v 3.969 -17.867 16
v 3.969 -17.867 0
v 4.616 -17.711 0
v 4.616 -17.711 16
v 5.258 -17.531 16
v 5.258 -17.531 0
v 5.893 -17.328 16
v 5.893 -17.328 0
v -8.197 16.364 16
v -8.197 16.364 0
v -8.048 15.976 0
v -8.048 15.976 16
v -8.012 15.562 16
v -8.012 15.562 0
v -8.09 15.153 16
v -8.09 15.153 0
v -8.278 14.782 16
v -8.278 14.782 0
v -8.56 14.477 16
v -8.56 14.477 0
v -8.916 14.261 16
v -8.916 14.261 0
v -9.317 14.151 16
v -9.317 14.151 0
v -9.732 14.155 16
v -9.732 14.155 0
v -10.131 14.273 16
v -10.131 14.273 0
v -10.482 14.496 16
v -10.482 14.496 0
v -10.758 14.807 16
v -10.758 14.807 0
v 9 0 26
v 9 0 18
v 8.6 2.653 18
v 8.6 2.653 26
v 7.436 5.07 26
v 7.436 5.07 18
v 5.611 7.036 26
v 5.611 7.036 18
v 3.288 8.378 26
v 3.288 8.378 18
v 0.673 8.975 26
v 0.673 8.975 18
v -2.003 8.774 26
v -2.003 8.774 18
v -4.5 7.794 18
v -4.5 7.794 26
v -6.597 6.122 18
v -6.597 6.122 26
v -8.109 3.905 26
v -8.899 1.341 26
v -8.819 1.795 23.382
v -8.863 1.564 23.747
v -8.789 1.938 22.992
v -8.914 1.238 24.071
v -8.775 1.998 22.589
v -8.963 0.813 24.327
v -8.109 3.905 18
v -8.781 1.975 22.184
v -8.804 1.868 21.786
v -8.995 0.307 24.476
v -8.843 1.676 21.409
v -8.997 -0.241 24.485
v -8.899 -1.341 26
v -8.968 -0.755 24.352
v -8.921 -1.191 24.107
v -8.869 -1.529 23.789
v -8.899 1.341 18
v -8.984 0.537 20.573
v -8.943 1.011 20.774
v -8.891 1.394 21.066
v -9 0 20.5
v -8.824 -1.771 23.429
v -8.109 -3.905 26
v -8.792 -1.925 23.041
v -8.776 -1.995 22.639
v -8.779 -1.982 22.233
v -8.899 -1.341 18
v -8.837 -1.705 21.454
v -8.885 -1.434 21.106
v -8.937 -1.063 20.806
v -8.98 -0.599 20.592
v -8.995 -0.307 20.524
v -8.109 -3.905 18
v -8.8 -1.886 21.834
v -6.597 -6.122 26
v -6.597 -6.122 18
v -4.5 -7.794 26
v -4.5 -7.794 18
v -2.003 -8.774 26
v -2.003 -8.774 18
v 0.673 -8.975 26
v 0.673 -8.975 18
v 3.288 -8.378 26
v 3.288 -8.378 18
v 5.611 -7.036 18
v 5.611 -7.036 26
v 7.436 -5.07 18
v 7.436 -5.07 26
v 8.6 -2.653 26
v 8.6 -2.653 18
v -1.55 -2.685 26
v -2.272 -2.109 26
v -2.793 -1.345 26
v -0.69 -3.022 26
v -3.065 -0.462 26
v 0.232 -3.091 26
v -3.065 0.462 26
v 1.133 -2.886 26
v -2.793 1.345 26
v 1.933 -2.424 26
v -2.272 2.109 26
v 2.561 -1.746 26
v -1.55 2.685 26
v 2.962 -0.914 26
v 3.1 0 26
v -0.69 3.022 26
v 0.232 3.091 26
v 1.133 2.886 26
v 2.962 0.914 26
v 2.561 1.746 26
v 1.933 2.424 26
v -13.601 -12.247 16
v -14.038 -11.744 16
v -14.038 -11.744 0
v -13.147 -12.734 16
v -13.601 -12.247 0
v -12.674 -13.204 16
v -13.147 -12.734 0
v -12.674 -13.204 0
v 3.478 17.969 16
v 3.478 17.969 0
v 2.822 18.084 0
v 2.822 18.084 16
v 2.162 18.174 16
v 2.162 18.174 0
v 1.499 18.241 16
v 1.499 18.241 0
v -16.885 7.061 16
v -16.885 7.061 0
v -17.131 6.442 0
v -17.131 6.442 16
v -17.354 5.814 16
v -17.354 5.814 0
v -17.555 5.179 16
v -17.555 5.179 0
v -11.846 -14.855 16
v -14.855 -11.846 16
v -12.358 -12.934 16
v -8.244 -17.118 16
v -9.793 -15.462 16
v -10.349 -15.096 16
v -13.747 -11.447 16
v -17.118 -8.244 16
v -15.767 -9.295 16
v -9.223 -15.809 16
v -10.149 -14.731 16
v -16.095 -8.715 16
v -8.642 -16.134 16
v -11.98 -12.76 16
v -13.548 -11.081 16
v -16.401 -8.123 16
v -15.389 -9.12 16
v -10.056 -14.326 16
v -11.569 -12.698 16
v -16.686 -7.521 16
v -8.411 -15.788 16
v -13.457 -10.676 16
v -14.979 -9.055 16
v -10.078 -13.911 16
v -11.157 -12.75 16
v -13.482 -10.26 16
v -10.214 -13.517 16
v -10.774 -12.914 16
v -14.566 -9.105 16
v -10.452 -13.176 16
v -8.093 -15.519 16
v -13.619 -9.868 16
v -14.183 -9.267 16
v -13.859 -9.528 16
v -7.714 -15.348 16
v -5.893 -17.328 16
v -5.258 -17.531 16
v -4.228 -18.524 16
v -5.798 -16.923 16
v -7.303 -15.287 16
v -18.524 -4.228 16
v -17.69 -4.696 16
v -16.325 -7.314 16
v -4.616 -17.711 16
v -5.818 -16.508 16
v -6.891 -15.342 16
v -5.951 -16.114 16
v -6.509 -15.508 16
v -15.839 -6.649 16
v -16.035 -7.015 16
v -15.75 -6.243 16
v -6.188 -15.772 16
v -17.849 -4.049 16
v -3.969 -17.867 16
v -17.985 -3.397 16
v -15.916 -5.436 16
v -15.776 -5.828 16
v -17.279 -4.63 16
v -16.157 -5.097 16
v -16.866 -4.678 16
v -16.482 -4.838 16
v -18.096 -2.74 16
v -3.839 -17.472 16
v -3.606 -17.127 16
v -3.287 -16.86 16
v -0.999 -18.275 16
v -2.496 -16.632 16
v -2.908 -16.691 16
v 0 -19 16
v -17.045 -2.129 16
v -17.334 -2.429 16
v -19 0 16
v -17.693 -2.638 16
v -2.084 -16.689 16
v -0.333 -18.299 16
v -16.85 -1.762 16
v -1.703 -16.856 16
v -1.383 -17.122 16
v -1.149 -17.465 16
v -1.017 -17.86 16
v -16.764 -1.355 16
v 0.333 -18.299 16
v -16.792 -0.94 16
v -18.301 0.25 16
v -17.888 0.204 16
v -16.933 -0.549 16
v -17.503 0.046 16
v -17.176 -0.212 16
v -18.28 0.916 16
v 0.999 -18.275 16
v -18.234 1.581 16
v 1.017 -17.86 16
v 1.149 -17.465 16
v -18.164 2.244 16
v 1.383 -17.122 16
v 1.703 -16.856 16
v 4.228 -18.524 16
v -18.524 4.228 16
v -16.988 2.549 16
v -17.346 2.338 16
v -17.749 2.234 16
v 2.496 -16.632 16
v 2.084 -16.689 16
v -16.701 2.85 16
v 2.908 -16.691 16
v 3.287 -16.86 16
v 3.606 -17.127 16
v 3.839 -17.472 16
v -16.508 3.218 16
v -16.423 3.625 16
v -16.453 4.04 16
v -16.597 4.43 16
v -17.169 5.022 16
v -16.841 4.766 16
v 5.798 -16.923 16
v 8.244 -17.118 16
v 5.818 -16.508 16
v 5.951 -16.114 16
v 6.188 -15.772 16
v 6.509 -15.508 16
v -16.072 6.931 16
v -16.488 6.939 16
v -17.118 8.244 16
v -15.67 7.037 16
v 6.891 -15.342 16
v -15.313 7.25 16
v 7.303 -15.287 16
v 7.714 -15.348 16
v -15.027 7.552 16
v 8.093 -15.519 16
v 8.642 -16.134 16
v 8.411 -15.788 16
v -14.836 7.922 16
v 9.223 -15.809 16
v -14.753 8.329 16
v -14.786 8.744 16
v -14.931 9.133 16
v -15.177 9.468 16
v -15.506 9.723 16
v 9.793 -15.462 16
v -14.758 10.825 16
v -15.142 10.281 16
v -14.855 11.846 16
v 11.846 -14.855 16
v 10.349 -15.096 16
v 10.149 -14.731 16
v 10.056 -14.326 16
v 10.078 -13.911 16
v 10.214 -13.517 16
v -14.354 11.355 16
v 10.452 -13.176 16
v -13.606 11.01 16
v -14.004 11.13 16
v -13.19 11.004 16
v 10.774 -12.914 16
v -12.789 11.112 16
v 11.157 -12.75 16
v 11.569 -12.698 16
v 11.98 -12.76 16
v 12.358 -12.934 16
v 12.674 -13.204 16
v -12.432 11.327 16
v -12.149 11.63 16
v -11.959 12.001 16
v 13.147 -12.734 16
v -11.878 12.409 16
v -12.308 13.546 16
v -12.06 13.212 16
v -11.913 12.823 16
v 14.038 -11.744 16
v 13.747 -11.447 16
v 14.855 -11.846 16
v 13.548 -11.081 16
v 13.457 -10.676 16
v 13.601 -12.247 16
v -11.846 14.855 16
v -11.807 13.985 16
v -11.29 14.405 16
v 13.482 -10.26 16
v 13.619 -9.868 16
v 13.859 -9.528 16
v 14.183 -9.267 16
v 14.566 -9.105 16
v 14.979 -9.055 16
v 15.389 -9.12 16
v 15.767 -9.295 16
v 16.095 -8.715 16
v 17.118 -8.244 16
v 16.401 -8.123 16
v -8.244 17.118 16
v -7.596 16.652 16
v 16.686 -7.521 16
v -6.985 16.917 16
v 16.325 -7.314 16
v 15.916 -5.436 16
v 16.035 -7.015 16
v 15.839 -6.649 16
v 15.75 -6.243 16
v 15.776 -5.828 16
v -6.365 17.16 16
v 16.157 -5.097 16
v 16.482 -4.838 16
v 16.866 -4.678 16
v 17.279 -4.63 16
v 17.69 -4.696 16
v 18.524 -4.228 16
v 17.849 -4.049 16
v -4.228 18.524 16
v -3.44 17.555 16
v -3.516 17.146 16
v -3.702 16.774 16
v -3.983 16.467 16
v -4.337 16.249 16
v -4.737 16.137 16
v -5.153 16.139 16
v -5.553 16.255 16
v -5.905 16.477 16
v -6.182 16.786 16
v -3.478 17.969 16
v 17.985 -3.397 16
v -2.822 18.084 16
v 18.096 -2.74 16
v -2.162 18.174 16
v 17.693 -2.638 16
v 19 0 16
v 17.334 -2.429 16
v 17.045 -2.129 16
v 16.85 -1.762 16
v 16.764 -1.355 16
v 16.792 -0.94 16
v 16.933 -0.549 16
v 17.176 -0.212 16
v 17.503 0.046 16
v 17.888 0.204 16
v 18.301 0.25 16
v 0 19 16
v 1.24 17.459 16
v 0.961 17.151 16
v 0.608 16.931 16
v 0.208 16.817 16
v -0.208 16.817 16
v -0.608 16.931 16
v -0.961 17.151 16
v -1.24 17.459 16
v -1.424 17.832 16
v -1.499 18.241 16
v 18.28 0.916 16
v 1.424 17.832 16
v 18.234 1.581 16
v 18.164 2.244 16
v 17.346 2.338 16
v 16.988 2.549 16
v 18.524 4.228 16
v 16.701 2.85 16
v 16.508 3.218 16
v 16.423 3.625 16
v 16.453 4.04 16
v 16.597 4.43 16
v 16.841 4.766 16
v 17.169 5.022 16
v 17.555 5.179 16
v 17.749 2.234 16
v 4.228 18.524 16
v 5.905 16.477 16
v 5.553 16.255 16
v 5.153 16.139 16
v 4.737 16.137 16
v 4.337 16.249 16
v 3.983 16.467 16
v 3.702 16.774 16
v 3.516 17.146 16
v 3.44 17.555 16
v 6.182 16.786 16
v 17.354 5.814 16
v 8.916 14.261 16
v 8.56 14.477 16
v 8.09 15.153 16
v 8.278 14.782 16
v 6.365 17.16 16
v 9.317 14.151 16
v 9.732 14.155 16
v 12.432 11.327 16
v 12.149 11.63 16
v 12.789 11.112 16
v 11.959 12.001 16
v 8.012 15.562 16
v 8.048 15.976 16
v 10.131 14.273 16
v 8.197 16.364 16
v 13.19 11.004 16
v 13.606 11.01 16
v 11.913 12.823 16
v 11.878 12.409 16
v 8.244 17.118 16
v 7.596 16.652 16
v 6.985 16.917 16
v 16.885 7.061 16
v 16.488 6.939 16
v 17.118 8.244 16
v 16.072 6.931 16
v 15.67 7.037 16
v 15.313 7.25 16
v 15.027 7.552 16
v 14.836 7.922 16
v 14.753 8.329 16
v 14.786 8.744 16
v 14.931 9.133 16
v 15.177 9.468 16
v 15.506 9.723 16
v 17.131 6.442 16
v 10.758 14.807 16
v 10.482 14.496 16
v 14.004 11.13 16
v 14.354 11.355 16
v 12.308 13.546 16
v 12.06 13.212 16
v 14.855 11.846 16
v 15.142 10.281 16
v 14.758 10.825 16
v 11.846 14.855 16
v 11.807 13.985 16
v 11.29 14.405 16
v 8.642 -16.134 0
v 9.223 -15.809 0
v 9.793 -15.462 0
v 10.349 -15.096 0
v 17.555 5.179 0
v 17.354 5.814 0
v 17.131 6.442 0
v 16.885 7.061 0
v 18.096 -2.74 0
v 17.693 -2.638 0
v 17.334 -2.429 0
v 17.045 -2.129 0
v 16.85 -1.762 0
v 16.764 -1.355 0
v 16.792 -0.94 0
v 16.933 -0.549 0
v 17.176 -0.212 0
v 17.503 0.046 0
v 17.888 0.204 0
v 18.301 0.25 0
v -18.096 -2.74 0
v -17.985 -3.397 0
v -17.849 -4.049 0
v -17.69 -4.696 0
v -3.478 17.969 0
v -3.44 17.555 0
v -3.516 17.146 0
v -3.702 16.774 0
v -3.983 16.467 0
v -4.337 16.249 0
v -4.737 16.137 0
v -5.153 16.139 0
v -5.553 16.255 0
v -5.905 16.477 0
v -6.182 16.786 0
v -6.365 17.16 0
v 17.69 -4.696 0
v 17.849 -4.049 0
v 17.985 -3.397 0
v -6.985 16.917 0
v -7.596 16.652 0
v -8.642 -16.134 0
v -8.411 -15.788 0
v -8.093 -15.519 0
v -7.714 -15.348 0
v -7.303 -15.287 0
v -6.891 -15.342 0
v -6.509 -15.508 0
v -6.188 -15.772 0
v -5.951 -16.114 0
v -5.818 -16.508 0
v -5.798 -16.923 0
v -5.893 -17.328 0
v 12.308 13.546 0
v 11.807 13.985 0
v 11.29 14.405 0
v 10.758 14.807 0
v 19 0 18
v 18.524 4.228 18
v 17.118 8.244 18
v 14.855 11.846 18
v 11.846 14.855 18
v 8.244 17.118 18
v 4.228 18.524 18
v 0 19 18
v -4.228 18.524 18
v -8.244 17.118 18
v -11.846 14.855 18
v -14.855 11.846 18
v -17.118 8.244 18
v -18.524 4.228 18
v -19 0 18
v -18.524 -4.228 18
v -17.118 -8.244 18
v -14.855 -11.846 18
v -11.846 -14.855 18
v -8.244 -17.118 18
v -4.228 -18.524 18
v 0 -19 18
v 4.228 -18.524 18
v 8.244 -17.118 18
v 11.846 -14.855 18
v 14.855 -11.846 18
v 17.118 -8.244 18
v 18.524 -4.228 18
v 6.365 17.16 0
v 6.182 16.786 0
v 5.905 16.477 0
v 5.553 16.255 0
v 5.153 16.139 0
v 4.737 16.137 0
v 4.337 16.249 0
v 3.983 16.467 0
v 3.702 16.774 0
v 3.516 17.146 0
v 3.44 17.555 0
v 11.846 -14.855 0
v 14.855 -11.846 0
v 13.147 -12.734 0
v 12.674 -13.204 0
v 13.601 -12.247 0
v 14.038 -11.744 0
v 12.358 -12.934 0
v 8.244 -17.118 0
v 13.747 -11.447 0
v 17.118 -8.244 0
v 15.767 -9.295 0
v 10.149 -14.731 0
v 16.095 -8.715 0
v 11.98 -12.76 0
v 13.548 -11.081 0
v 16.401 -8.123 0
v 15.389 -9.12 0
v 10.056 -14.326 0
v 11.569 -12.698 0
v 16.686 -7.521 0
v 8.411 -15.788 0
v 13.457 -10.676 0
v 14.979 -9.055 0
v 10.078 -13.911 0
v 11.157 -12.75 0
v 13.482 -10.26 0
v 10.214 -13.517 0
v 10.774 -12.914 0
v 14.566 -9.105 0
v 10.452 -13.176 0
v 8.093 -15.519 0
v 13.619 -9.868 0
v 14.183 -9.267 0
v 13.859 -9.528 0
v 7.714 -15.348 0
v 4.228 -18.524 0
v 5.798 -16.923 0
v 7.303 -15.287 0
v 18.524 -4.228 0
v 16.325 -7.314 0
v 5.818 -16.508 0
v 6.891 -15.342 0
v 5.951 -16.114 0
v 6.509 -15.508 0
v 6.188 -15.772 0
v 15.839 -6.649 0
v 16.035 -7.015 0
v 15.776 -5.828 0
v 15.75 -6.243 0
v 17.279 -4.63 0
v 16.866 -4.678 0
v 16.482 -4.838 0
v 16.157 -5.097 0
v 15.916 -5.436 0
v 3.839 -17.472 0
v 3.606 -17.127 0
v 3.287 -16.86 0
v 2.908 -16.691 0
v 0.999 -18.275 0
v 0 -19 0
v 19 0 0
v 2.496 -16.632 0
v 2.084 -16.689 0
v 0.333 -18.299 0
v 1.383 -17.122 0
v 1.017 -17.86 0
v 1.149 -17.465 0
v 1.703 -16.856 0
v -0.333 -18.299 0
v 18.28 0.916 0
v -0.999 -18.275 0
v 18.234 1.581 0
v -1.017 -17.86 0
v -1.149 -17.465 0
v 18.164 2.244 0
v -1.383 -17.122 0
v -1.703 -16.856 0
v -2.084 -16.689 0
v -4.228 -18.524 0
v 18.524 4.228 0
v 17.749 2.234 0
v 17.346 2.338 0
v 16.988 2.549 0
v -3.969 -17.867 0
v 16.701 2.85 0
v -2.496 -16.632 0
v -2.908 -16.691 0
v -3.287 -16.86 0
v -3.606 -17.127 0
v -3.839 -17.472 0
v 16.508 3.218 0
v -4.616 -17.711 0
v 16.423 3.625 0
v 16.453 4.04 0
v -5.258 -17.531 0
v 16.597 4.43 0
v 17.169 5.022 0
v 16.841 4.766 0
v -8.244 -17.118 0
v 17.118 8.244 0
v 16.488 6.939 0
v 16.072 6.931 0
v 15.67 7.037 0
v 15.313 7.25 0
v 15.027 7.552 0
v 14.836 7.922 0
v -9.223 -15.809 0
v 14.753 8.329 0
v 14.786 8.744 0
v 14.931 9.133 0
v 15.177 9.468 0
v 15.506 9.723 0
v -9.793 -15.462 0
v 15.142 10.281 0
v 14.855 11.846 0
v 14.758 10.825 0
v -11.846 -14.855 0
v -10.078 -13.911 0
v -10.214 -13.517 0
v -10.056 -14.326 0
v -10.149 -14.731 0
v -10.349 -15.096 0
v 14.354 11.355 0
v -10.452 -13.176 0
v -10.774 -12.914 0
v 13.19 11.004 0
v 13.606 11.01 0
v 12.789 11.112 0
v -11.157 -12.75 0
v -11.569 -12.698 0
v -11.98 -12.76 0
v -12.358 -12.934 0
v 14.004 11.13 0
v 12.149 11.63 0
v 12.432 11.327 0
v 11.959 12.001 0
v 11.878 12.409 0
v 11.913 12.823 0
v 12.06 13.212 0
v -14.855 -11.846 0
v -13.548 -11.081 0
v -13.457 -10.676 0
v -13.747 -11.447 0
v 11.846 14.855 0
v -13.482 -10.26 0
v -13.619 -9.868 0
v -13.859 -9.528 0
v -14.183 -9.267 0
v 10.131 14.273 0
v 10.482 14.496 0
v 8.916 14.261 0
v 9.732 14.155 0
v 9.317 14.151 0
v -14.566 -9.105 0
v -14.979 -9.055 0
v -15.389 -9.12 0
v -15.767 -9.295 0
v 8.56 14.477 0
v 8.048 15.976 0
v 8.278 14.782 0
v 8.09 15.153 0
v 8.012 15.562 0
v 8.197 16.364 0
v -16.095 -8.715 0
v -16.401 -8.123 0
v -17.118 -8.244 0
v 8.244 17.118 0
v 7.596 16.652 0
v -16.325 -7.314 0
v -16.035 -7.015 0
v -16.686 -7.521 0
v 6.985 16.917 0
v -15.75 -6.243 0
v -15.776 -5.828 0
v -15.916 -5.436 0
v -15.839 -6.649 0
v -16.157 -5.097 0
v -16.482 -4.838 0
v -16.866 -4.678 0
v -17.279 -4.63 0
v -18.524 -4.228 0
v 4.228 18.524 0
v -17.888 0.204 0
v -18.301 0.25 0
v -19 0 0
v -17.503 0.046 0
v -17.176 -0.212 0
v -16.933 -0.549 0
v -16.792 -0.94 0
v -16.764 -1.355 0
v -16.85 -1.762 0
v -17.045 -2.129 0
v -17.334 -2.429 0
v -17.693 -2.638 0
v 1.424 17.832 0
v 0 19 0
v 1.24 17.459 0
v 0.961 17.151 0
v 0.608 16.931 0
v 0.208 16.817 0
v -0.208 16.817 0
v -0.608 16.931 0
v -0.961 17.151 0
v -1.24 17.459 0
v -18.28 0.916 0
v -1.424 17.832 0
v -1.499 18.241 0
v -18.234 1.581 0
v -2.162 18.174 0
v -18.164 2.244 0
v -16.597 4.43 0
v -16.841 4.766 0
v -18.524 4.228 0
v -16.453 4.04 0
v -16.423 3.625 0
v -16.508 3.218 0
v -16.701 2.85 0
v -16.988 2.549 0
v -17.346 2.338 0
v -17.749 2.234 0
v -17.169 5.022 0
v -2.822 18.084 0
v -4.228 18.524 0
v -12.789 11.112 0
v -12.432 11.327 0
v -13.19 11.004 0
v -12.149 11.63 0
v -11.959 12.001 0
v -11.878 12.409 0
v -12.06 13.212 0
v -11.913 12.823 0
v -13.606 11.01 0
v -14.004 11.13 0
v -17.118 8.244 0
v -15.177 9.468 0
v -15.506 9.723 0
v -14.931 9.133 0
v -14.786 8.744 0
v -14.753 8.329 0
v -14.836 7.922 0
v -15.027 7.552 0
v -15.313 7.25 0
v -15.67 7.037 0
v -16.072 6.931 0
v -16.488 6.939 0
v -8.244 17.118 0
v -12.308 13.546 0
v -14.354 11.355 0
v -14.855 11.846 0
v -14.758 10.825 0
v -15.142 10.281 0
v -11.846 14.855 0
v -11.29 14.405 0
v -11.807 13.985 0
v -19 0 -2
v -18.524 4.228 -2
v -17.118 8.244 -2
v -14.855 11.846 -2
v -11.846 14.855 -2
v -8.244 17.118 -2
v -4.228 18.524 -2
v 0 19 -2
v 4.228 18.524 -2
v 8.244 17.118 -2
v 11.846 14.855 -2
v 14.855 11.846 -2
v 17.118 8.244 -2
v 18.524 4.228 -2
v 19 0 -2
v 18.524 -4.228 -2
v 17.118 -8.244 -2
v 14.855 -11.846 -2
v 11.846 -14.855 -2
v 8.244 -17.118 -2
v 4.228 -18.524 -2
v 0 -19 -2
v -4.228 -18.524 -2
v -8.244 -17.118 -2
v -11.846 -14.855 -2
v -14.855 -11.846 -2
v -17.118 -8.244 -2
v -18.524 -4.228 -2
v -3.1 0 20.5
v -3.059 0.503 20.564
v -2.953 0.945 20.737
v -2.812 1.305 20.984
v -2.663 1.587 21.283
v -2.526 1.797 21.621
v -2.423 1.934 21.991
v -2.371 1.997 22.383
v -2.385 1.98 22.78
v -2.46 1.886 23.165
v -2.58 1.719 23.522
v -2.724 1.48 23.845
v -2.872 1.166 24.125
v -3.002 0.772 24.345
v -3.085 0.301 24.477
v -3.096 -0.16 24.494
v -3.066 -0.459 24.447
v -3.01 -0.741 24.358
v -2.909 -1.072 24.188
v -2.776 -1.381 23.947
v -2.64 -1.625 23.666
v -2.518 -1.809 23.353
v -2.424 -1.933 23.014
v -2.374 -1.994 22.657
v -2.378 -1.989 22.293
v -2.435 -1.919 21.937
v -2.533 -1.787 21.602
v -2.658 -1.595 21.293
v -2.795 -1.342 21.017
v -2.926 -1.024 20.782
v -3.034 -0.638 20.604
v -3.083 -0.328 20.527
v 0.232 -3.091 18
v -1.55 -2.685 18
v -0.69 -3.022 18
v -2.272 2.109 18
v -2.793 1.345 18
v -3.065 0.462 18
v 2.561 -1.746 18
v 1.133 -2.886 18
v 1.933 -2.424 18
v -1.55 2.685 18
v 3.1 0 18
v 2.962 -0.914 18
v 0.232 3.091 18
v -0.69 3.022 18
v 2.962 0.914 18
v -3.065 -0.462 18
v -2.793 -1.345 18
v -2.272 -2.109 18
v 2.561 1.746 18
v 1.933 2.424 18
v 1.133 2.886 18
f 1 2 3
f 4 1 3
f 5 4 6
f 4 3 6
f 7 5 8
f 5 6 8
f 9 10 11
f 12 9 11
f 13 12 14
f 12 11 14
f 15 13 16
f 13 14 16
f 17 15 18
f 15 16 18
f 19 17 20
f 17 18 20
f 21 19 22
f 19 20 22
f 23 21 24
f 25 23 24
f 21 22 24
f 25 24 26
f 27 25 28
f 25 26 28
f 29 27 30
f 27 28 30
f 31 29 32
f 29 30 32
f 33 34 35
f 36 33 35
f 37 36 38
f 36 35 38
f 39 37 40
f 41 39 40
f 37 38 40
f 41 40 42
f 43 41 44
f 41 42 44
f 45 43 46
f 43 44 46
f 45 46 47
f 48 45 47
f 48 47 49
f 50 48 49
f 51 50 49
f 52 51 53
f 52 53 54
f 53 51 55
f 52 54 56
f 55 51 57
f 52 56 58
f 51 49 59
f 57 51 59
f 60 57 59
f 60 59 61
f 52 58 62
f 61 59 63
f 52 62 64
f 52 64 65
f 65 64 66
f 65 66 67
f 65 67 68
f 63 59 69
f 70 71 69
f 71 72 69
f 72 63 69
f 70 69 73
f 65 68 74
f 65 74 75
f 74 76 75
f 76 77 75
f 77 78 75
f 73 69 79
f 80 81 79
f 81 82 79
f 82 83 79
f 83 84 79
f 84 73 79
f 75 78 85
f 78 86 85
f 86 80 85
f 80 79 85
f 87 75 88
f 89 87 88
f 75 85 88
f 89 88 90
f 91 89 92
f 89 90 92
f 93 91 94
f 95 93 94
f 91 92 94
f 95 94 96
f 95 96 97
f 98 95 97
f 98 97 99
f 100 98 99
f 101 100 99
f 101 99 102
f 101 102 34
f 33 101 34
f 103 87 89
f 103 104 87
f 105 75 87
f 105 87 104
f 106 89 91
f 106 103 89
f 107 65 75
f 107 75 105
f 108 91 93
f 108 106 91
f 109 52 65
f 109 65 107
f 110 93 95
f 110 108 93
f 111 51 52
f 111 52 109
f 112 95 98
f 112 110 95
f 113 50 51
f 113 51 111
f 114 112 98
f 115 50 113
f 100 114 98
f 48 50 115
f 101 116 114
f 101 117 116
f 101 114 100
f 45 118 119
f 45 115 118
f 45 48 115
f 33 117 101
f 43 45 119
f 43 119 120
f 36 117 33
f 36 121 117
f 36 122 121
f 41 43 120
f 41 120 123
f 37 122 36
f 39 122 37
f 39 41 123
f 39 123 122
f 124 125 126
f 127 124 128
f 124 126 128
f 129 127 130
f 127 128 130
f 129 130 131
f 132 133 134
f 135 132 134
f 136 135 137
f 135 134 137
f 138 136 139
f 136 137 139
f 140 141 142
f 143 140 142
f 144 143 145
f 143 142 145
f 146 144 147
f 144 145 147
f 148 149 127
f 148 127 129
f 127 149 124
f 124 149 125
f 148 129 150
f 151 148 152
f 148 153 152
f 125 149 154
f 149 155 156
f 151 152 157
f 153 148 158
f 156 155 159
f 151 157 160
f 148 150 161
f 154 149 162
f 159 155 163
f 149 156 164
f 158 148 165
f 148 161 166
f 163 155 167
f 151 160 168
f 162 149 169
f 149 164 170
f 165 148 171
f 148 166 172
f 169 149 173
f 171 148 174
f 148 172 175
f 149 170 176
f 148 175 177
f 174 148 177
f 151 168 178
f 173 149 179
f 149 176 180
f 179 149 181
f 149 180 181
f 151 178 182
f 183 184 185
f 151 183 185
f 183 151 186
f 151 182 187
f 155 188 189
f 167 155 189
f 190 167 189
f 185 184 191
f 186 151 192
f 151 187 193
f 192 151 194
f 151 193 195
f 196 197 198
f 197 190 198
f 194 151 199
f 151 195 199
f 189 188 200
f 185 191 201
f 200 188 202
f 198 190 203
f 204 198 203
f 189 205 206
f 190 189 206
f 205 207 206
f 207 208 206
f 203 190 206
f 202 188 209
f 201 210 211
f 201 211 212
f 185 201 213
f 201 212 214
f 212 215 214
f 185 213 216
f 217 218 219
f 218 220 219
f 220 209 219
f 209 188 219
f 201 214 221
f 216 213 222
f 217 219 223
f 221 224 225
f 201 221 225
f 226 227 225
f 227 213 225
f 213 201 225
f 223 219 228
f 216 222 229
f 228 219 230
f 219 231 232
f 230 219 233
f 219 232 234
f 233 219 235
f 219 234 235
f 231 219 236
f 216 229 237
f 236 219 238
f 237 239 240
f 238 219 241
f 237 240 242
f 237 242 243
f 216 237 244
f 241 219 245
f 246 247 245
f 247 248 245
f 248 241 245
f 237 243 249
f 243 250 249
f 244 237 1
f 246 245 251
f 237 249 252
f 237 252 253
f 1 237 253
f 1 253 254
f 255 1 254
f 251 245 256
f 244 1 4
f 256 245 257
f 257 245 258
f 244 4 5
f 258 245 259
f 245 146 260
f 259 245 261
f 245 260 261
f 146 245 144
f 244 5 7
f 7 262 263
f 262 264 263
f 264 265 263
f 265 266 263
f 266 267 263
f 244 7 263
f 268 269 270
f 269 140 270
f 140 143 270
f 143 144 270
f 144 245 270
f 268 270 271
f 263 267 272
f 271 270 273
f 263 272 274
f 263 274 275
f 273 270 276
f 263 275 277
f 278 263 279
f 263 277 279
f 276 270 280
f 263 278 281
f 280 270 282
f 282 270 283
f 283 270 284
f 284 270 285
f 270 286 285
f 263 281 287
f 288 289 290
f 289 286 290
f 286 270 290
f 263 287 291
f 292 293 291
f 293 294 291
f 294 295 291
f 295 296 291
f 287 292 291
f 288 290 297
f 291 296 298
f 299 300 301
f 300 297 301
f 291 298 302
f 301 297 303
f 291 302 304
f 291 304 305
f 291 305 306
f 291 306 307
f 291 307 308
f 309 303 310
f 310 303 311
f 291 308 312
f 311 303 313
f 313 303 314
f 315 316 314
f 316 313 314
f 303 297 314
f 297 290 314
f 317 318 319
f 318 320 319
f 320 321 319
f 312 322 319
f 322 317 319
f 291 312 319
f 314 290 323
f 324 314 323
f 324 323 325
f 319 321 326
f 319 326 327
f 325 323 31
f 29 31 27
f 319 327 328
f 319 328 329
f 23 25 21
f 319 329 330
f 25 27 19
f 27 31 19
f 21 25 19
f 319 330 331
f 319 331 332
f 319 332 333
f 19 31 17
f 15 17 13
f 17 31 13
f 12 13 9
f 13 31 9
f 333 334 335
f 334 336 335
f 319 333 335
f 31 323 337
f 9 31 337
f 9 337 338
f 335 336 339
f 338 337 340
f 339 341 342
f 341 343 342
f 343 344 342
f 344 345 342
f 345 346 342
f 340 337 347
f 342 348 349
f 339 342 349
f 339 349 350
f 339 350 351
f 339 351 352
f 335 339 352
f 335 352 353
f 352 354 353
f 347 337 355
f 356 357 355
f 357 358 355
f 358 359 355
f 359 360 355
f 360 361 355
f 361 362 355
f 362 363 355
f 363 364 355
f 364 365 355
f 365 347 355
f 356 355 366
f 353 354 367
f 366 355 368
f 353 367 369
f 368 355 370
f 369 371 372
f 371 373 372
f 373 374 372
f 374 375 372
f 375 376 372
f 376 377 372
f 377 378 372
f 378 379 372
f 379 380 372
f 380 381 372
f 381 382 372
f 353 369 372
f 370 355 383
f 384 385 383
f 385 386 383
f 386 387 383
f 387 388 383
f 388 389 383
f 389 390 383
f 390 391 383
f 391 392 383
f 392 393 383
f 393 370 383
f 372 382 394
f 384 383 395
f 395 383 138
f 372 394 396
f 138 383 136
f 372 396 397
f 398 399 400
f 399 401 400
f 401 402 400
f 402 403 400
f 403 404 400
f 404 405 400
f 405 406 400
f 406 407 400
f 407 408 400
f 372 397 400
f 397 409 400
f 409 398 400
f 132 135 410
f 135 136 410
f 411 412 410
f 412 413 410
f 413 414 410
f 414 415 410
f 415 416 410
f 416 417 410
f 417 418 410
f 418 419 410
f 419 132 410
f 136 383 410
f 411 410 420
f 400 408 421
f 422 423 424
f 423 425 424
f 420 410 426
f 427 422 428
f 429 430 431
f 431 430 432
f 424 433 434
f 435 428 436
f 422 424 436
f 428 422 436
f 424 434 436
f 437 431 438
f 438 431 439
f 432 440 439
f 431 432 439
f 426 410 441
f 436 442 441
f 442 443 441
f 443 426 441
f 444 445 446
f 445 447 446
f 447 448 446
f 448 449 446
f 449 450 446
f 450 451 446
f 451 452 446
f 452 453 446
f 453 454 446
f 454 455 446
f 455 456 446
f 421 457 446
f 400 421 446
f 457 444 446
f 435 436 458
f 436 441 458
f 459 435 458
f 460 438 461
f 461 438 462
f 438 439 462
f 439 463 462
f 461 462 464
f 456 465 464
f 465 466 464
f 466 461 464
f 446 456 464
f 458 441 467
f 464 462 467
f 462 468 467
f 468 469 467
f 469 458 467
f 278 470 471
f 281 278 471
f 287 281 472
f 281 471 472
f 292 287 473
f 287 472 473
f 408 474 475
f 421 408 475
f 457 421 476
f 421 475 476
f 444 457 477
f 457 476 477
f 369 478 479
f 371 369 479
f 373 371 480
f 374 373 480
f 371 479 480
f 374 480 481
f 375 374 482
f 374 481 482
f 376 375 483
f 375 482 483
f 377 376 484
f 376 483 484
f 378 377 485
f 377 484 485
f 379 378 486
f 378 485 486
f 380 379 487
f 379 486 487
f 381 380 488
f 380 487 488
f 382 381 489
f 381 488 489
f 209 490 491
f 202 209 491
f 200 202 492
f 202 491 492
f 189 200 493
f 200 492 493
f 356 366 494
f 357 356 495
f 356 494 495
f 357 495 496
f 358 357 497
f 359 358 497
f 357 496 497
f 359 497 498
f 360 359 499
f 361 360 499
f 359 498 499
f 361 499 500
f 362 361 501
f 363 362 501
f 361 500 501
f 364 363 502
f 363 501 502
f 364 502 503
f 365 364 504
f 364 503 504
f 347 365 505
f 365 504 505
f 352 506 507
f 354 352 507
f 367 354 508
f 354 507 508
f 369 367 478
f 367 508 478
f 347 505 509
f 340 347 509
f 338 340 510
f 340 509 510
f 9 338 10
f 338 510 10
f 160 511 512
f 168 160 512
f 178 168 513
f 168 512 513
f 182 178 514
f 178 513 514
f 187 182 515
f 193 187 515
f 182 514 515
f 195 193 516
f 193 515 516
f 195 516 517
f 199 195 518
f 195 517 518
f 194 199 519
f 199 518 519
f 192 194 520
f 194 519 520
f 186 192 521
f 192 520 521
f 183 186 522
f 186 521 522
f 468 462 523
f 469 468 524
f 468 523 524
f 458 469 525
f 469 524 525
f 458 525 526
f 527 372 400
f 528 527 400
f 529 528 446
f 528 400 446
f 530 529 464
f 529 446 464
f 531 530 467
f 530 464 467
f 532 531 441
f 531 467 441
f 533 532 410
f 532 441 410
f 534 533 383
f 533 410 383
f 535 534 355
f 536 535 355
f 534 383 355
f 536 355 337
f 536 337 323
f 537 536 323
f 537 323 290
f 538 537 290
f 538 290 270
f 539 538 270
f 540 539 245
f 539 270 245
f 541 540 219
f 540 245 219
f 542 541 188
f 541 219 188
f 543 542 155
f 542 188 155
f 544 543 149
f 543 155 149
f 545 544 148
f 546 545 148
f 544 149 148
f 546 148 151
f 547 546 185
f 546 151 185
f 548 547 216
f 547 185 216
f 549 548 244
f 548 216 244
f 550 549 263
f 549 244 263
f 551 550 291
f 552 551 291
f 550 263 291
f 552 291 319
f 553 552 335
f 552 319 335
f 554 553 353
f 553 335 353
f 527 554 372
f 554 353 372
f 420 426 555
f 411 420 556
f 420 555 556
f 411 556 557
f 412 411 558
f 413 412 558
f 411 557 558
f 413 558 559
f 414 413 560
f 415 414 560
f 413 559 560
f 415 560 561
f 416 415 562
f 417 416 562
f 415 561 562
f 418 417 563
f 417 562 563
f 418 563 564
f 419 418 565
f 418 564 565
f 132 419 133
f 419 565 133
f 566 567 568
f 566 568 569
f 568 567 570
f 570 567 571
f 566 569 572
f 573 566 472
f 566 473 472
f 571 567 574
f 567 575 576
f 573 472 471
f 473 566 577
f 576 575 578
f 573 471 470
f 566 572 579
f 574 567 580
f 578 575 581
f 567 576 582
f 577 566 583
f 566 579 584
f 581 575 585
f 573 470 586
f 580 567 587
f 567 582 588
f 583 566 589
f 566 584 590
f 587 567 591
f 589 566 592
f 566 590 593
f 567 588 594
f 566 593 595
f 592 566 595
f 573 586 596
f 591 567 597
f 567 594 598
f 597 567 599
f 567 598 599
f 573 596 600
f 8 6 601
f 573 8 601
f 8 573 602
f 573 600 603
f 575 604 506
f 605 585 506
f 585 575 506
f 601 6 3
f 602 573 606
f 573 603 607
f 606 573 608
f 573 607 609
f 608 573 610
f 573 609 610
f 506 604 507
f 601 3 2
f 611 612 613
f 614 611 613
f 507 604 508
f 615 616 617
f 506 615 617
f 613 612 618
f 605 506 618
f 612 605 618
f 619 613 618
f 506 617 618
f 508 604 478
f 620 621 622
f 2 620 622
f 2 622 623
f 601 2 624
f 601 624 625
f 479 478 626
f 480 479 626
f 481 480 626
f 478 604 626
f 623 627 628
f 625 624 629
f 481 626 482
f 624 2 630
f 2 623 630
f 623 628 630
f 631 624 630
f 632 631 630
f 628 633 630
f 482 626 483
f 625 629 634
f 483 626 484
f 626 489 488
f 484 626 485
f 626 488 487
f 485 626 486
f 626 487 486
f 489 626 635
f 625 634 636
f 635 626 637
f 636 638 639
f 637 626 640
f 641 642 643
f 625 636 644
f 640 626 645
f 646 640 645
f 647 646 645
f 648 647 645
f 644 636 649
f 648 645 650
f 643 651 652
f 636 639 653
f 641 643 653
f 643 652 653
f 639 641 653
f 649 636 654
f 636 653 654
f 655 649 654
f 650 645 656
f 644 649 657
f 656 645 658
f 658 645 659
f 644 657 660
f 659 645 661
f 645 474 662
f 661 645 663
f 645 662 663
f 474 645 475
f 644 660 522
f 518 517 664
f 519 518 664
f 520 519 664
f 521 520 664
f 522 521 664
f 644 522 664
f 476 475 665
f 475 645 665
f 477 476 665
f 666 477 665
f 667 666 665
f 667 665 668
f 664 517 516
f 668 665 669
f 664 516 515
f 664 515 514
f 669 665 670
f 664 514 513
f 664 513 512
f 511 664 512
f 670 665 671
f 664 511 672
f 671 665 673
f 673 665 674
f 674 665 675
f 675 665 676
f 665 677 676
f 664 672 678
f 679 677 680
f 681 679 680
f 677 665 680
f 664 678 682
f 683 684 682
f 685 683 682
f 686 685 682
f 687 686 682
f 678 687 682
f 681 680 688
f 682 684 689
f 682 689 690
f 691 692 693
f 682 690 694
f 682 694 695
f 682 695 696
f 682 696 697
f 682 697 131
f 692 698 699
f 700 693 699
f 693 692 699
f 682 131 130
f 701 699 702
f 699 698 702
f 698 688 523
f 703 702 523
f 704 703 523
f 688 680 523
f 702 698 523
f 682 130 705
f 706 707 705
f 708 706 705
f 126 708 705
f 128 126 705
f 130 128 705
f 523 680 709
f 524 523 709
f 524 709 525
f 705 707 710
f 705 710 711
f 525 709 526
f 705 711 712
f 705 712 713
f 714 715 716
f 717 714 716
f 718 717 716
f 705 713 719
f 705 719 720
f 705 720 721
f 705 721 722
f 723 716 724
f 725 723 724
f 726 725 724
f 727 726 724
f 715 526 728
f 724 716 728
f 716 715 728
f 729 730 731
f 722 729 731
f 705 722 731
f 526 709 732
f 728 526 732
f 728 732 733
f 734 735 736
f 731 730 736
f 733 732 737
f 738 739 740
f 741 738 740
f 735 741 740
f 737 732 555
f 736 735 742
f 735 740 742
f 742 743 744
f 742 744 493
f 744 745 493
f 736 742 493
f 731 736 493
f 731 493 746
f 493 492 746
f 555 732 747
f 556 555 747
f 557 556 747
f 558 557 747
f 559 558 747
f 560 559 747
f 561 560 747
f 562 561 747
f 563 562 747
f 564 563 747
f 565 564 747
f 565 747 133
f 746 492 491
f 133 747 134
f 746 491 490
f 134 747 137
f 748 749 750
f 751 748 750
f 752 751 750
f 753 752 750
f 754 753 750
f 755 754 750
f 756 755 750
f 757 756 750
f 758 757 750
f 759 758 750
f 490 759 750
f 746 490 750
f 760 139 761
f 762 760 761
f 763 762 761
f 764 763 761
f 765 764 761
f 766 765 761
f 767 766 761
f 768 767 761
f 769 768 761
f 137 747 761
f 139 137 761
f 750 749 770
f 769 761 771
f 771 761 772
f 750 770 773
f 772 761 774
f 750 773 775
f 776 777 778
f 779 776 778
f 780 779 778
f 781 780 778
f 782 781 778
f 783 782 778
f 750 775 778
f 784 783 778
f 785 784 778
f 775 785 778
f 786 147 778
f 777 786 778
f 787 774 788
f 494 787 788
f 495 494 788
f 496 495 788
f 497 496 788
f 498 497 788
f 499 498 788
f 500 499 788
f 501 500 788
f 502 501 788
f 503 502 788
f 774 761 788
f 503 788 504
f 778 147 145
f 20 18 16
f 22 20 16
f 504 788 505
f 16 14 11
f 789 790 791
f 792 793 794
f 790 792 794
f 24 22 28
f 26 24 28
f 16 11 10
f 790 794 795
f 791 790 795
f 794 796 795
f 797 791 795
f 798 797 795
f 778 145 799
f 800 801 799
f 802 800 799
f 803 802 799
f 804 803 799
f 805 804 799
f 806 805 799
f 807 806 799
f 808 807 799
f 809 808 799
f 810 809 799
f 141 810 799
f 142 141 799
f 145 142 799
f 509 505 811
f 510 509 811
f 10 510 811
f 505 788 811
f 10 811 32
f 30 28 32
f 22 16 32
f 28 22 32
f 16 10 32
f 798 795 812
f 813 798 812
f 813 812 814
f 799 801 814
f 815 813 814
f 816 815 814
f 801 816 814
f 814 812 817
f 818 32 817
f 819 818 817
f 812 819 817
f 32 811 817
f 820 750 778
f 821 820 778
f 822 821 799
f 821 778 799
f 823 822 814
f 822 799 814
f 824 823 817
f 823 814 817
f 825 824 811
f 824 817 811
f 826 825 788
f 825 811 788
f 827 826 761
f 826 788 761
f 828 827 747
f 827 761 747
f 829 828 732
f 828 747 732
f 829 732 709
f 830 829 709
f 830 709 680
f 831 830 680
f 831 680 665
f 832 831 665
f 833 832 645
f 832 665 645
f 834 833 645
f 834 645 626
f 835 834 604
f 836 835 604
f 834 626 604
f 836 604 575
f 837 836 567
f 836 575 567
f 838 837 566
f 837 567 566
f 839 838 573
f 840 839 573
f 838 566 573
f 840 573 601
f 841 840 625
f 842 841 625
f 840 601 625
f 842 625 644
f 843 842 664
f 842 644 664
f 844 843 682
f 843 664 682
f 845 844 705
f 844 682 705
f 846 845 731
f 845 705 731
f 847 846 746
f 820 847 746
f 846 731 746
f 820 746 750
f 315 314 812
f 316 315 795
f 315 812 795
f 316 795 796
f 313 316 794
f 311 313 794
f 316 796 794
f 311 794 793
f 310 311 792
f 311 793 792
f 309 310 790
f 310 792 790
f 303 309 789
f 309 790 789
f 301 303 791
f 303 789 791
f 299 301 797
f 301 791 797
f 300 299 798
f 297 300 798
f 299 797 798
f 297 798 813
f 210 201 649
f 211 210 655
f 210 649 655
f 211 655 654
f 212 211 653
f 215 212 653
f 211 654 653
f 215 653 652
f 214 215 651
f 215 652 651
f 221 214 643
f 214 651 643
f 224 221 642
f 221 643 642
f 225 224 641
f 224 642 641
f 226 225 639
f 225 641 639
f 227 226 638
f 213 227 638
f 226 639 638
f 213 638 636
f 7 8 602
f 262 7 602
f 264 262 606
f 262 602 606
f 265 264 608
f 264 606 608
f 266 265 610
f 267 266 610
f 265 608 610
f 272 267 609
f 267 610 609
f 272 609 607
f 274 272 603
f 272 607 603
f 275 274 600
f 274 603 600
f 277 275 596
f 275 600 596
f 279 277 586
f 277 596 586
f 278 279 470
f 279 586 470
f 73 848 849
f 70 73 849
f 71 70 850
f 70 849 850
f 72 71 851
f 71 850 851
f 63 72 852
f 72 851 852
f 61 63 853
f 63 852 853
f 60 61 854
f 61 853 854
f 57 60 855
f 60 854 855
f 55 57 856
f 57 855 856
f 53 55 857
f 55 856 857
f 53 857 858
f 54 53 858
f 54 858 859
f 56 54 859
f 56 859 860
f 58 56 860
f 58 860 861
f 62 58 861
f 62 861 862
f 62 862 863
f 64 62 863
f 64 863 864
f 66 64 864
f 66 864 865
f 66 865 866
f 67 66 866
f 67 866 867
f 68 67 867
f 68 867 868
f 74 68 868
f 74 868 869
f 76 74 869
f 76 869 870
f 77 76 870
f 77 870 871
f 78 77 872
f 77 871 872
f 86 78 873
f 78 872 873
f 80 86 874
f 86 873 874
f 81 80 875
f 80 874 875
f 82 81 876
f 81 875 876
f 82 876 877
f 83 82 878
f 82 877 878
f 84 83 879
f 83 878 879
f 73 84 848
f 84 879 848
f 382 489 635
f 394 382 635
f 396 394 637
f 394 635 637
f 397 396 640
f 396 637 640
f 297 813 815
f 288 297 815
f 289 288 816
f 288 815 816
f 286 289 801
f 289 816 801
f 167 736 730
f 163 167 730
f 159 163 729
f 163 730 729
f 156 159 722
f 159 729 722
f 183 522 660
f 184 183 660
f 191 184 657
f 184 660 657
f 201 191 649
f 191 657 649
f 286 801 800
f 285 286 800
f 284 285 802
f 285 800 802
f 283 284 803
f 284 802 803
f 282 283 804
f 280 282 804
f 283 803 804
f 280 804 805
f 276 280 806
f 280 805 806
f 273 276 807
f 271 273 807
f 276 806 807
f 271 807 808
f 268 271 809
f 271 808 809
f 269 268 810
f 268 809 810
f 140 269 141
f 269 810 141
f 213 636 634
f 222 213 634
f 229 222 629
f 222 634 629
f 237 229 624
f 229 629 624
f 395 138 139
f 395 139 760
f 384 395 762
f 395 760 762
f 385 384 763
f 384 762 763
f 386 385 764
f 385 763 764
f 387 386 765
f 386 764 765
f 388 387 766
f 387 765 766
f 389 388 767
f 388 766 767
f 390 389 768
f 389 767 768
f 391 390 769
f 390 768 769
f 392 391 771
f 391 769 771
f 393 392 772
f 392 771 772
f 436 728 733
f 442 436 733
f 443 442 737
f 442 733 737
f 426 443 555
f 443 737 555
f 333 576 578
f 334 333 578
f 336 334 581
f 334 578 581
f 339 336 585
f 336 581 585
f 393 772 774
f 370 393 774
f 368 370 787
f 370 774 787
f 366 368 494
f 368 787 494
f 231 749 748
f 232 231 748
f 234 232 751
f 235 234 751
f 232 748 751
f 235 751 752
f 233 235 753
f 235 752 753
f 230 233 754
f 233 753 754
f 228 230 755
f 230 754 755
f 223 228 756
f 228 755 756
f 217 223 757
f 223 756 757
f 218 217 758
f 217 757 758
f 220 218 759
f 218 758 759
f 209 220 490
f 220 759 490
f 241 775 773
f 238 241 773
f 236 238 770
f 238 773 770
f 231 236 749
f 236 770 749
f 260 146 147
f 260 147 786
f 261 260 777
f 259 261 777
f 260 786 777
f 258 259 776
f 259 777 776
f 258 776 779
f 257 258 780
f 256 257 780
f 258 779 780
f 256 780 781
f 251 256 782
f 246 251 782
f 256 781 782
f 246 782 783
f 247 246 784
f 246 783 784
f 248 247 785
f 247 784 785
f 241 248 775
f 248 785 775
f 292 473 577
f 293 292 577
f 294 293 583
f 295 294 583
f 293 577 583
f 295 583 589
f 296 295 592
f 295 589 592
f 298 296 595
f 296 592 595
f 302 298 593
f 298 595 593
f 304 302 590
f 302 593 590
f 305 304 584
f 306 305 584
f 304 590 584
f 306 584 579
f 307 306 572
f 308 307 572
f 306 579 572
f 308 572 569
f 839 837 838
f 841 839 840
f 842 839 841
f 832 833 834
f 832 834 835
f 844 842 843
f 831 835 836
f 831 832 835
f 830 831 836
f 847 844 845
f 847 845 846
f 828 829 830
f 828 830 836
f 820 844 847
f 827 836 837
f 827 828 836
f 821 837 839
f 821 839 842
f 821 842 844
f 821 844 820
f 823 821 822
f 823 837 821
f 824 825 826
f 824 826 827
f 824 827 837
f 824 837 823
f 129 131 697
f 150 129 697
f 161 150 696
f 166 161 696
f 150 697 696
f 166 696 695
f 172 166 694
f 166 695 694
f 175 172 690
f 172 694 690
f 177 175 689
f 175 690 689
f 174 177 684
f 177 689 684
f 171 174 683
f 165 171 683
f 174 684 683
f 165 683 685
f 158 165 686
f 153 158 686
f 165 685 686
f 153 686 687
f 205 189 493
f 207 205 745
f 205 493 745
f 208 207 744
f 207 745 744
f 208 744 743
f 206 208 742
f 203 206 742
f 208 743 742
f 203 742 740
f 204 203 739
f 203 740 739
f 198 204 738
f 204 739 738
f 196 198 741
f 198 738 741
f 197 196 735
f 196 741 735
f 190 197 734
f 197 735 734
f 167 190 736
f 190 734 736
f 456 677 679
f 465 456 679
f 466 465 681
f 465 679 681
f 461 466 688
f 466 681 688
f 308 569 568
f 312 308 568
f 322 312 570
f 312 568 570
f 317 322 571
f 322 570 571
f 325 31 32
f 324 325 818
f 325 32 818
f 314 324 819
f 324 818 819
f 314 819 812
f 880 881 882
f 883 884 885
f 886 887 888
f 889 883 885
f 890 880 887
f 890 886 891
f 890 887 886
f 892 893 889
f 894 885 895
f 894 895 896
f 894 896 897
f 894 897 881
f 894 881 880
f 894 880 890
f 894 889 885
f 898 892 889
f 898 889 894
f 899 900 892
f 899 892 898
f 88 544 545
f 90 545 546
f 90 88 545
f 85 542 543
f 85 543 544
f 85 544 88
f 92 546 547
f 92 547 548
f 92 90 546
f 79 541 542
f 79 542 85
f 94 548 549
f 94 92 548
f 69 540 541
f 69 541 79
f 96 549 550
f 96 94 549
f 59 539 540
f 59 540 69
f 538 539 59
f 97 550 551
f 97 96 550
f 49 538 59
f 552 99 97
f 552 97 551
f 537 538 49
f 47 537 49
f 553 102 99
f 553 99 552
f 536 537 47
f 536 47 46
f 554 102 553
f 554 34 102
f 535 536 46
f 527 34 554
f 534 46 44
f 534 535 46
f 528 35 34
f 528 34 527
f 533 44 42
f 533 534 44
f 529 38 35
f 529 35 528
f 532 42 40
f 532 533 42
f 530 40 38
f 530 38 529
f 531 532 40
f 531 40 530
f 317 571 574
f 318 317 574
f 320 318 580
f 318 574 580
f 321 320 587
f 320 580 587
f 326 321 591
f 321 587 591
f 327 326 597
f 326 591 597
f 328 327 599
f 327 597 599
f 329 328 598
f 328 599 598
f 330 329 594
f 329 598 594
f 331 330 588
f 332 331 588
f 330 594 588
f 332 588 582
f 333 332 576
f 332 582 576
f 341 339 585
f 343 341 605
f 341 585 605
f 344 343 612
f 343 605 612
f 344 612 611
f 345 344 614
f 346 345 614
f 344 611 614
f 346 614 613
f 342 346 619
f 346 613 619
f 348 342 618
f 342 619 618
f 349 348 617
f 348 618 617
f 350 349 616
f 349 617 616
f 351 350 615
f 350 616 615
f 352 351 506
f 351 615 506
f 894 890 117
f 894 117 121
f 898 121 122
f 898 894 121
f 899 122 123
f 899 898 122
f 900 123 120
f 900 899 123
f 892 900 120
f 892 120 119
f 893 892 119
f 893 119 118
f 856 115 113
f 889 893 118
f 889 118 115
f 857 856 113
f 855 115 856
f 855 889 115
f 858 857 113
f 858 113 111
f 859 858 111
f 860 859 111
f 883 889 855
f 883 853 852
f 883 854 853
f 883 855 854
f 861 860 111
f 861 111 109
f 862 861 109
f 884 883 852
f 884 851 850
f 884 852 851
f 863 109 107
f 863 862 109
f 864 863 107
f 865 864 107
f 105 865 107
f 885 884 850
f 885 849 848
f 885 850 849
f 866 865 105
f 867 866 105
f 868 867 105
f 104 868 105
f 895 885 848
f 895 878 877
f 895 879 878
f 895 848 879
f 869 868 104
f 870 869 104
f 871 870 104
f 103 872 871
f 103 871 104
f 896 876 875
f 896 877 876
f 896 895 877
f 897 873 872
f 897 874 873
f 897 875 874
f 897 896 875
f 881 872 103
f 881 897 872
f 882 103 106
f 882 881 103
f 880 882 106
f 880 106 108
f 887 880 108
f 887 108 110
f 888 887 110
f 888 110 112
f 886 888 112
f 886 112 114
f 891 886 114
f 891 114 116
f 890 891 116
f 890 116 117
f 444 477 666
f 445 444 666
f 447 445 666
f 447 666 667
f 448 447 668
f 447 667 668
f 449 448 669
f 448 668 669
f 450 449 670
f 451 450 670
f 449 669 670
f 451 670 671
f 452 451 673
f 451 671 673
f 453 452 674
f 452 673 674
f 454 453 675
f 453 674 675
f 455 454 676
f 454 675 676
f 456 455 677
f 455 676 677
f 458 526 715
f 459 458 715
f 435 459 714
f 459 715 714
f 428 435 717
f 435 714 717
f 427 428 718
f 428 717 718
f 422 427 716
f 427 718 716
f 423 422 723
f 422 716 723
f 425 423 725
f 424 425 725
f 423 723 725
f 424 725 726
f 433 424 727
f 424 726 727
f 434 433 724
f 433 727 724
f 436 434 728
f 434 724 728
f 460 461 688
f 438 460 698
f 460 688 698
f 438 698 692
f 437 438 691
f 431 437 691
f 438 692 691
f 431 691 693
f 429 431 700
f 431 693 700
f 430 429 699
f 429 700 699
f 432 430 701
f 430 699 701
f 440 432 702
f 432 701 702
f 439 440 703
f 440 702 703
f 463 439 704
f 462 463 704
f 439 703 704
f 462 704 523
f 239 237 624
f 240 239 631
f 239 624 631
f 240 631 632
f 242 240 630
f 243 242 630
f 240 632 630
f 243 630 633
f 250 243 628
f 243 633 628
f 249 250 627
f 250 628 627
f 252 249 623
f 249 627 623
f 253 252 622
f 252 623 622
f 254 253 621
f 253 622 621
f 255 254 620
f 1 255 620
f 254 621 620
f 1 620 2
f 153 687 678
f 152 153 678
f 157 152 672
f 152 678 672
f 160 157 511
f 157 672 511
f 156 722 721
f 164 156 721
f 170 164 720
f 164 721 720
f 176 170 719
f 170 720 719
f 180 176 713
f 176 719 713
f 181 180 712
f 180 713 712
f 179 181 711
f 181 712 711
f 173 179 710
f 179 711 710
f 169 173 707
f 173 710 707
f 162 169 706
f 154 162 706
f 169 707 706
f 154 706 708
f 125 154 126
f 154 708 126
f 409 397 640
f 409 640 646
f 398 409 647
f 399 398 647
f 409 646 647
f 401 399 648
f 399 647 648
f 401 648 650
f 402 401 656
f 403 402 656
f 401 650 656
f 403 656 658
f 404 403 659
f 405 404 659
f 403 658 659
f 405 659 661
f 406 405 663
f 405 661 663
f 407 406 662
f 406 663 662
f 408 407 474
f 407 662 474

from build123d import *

# Parameters (mm, degrees)
EXTRUDE_1_DEPTH     = 16
SKETCH_2_R          = 19
EXTRUDE_2_DEPTH     = 2
SKETCH_3_R          = 19
EXTRUDE_3_DEPTH     = 2
SKETCH_4_R          = 9
SKETCH_4_R_2        = 3.1
EXTRUDE_4_DEPTH     = 8
SKETCH_5_R          = 2
CUT_EXTRUDE_1_DEPTH = 20


with BuildPart() as part:
    # Эскиз1 → Бобышка-Вытянуть1 (new body)
    with BuildSketch(Plane.XY):
        with BuildLine():
            ThreePointArc((-1.498740073, 18.241032987), (-2.492190095, 18.132029527), (-3.478209077, 17.968961235))
            ThreePointArc((-3.478209077, 17.968961235), (-4.533260247, 16.179417721), (-6.364534528, 17.16025077))
            ThreePointArc((-6.364534528, 17.16025077), (-7.291735947, 16.787259846), (-8.197195372, 16.364213831))
            ThreePointArc((-8.197195372, 16.364213831), (-8.73030932, 14.356382045), (-10.758300573, 14.806771256))
            ThreePointArc((-10.758300573, 14.806771256), (-11.550487101, 14.197455898), (-12.308233185, 13.545807547))
            ThreePointArc((-12.308233185, 13.545807547), (-12.27987129, 11.468599189), (-14.35417268, 11.355141255))
            ThreePointArc((-14.35417268, 11.355141255), (-14.952591467, 10.554691596), (-15.50642565, 9.722770687))
            ThreePointArc((-15.50642565, 9.722770687), (-14.918691382, 7.730242796), (-16.885461466, 7.061352373))
            ThreePointArc((-16.885461466, 7.061352373), (-17.245730527, 6.129134102), (-17.554577461, 5.178640403))
            ThreePointArc((-17.554577461, 5.178640403), (-16.451060383, 3.418569659), (-18.164432821, 2.243855289))
            ThreePointArc((-18.164432821, 2.243855289), (-18.259832648, 1.249006771), (-18.300786569, 0.250434051))
            ThreePointArc((-18.300786569, 0.250434051), (-16.763329494, -1.146643151), (-18.09623129, -2.740058277))
            ThreePointArc((-18.09623129, -2.740058277), (-17.919686515, -3.723753679), (-17.689710057, -4.696345849))
            ThreePointArc((-17.689710057, -4.696345849), (-15.832339144, -5.626814684), (-16.685915069, -7.520754256))
            ThreePointArc((-16.685915069, -7.520754256), (-16.25051921, -8.420340353), (-15.766668676, -9.294819262))
            ThreePointArc((-15.766668676, -9.294819262), (-13.727136627, -9.689671112), (-14.03808086, -11.743670296))
            ThreePointArc((-14.03808086, -11.743670296), (-13.376125236, -12.492428904), (-12.674285607, -13.203938451))
            ThreePointArc((-12.674285607, -13.203938451), (-10.603855185, -13.033888962), (-10.349106414, -15.095612034))
            ThreePointArc((-10.349106414, -15.095612034), (-9.509685246, -15.638011152), (-8.641908755, -16.133781929))
            ThreePointArc((-8.641908755, -16.133781929), (-6.694134312, -15.411442894), (-5.892586089, -17.327981286))
            ThreePointArc((-5.892586089, -17.327981286), (-4.937955404, -17.623793652), (-3.968601065, -17.867056608))
            ThreePointArc((-3.968601065, -17.867056608), (-2.287940121, -16.646000608), (-0.999039611, -18.275213435))
            ThreePointArc((-0.999039611, -18.275213435), (0, -18.3025), (0.999039611, -18.275213435))
            ThreePointArc((0.999039611, -18.275213435), (2.287940121, -16.646000608), (3.968601065, -17.867056608))
            ThreePointArc((3.968601065, -17.867056608), (4.937955404, -17.623793652), (5.892586089, -17.327981286))
            ThreePointArc((5.892586089, -17.327981286), (6.694134312, -15.411442894), (8.641908755, -16.133781929))
            ThreePointArc((8.641908755, -16.133781929), (9.509685246, -15.638011152), (10.349106414, -15.095612034))
            ThreePointArc((10.349106414, -15.095612034), (10.603855185, -13.033888962), (12.674285607, -13.203938451))
            ThreePointArc((12.674285607, -13.203938451), (13.376125236, -12.492428904), (14.03808086, -11.743670296))
            ThreePointArc((14.03808086, -11.743670296), (13.727136627, -9.689671112), (15.766668676, -9.294819262))
            ThreePointArc((15.766668676, -9.294819262), (16.25051921, -8.420340353), (16.685915069, -7.520754256))
            ThreePointArc((16.685915069, -7.520754256), (15.832339144, -5.626814684), (17.689710057, -4.696345849))
            ThreePointArc((17.689710057, -4.696345849), (17.919686515, -3.723753679), (18.09623129, -2.740058277))
            ThreePointArc((18.09623129, -2.740058277), (16.763329494, -1.146643151), (18.300786569, 0.250434051))
            ThreePointArc((18.300786569, 0.250434051), (18.259832648, 1.249006771), (18.164432821, 2.243855289))
            ThreePointArc((18.164432821, 2.243855289), (16.451060383, 3.418569659), (17.554577461, 5.178640403))
            ThreePointArc((17.554577461, 5.178640403), (17.245730527, 6.129134102), (16.885461466, 7.061352373))
            ThreePointArc((16.885461466, 7.061352373), (14.918691382, 7.730242796), (15.50642565, 9.722770687))
            ThreePointArc((15.50642565, 9.722770687), (14.952591467, 10.554691596), (14.35417268, 11.355141255))
            ThreePointArc((14.35417268, 11.355141255), (12.27987129, 11.468599189), (12.308233185, 13.545807547))
            ThreePointArc((12.308233185, 13.545807547), (11.550487101, 14.197455898), (10.758300573, 14.806771256))
            ThreePointArc((10.758300573, 14.806771256), (8.73030932, 14.356382045), (8.197195372, 16.364213831))
            ThreePointArc((8.197195372, 16.364213831), (7.291735947, 16.787259846), (6.364534528, 17.16025077))
            ThreePointArc((6.364534528, 17.16025077), (4.533260247, 16.179417721), (3.478209077, 17.968961235))
            ThreePointArc((3.478209077, 17.968961235), (2.492190095, 18.132029527), (1.498740073, 18.241032987))
            ThreePointArc((1.498740073, 18.241032987), (0, 16.8025), (-1.498740073, 18.241032987))
        make_face()
    extrude(amount=EXTRUDE_1_DEPTH)

    # Эскиз2 → Бобышка-Вытянуть2 (add)
    with BuildSketch(Plane(origin=(0, 0, 0), x_dir=(-1, 0, 0), z_dir=(0, 0, -1))):
        Circle(SKETCH_2_R)
    extrude(amount=EXTRUDE_2_DEPTH)

    # Эскиз3 → Бобышка-Вытянуть3 (add)
    with BuildSketch(Plane.XY.offset(16)):
        Circle(SKETCH_3_R)
    extrude(amount=EXTRUDE_3_DEPTH)

    # Эскиз4 → Бобышка-Вытянуть4 (add)
    with BuildSketch(Plane.XY.offset(18)):
        Circle(SKETCH_4_R)
        Circle(SKETCH_4_R_2, mode=Mode.SUBTRACT)
    extrude(amount=EXTRUDE_4_DEPTH)

    # Эскиз5 → Вырез-Вытянуть1 (cut, through all)
    with BuildSketch(Plane(origin=(0, 0, 0), x_dir=(0, 0, -1), z_dir=(1, 0, 0))):
        with Locations((-22.5, 0)):
            Circle(SKETCH_5_R)
    extrude(amount=-CUT_EXTRUDE_1_DEPTH, mode=Mode.SUBTRACT)


solid = part.part
